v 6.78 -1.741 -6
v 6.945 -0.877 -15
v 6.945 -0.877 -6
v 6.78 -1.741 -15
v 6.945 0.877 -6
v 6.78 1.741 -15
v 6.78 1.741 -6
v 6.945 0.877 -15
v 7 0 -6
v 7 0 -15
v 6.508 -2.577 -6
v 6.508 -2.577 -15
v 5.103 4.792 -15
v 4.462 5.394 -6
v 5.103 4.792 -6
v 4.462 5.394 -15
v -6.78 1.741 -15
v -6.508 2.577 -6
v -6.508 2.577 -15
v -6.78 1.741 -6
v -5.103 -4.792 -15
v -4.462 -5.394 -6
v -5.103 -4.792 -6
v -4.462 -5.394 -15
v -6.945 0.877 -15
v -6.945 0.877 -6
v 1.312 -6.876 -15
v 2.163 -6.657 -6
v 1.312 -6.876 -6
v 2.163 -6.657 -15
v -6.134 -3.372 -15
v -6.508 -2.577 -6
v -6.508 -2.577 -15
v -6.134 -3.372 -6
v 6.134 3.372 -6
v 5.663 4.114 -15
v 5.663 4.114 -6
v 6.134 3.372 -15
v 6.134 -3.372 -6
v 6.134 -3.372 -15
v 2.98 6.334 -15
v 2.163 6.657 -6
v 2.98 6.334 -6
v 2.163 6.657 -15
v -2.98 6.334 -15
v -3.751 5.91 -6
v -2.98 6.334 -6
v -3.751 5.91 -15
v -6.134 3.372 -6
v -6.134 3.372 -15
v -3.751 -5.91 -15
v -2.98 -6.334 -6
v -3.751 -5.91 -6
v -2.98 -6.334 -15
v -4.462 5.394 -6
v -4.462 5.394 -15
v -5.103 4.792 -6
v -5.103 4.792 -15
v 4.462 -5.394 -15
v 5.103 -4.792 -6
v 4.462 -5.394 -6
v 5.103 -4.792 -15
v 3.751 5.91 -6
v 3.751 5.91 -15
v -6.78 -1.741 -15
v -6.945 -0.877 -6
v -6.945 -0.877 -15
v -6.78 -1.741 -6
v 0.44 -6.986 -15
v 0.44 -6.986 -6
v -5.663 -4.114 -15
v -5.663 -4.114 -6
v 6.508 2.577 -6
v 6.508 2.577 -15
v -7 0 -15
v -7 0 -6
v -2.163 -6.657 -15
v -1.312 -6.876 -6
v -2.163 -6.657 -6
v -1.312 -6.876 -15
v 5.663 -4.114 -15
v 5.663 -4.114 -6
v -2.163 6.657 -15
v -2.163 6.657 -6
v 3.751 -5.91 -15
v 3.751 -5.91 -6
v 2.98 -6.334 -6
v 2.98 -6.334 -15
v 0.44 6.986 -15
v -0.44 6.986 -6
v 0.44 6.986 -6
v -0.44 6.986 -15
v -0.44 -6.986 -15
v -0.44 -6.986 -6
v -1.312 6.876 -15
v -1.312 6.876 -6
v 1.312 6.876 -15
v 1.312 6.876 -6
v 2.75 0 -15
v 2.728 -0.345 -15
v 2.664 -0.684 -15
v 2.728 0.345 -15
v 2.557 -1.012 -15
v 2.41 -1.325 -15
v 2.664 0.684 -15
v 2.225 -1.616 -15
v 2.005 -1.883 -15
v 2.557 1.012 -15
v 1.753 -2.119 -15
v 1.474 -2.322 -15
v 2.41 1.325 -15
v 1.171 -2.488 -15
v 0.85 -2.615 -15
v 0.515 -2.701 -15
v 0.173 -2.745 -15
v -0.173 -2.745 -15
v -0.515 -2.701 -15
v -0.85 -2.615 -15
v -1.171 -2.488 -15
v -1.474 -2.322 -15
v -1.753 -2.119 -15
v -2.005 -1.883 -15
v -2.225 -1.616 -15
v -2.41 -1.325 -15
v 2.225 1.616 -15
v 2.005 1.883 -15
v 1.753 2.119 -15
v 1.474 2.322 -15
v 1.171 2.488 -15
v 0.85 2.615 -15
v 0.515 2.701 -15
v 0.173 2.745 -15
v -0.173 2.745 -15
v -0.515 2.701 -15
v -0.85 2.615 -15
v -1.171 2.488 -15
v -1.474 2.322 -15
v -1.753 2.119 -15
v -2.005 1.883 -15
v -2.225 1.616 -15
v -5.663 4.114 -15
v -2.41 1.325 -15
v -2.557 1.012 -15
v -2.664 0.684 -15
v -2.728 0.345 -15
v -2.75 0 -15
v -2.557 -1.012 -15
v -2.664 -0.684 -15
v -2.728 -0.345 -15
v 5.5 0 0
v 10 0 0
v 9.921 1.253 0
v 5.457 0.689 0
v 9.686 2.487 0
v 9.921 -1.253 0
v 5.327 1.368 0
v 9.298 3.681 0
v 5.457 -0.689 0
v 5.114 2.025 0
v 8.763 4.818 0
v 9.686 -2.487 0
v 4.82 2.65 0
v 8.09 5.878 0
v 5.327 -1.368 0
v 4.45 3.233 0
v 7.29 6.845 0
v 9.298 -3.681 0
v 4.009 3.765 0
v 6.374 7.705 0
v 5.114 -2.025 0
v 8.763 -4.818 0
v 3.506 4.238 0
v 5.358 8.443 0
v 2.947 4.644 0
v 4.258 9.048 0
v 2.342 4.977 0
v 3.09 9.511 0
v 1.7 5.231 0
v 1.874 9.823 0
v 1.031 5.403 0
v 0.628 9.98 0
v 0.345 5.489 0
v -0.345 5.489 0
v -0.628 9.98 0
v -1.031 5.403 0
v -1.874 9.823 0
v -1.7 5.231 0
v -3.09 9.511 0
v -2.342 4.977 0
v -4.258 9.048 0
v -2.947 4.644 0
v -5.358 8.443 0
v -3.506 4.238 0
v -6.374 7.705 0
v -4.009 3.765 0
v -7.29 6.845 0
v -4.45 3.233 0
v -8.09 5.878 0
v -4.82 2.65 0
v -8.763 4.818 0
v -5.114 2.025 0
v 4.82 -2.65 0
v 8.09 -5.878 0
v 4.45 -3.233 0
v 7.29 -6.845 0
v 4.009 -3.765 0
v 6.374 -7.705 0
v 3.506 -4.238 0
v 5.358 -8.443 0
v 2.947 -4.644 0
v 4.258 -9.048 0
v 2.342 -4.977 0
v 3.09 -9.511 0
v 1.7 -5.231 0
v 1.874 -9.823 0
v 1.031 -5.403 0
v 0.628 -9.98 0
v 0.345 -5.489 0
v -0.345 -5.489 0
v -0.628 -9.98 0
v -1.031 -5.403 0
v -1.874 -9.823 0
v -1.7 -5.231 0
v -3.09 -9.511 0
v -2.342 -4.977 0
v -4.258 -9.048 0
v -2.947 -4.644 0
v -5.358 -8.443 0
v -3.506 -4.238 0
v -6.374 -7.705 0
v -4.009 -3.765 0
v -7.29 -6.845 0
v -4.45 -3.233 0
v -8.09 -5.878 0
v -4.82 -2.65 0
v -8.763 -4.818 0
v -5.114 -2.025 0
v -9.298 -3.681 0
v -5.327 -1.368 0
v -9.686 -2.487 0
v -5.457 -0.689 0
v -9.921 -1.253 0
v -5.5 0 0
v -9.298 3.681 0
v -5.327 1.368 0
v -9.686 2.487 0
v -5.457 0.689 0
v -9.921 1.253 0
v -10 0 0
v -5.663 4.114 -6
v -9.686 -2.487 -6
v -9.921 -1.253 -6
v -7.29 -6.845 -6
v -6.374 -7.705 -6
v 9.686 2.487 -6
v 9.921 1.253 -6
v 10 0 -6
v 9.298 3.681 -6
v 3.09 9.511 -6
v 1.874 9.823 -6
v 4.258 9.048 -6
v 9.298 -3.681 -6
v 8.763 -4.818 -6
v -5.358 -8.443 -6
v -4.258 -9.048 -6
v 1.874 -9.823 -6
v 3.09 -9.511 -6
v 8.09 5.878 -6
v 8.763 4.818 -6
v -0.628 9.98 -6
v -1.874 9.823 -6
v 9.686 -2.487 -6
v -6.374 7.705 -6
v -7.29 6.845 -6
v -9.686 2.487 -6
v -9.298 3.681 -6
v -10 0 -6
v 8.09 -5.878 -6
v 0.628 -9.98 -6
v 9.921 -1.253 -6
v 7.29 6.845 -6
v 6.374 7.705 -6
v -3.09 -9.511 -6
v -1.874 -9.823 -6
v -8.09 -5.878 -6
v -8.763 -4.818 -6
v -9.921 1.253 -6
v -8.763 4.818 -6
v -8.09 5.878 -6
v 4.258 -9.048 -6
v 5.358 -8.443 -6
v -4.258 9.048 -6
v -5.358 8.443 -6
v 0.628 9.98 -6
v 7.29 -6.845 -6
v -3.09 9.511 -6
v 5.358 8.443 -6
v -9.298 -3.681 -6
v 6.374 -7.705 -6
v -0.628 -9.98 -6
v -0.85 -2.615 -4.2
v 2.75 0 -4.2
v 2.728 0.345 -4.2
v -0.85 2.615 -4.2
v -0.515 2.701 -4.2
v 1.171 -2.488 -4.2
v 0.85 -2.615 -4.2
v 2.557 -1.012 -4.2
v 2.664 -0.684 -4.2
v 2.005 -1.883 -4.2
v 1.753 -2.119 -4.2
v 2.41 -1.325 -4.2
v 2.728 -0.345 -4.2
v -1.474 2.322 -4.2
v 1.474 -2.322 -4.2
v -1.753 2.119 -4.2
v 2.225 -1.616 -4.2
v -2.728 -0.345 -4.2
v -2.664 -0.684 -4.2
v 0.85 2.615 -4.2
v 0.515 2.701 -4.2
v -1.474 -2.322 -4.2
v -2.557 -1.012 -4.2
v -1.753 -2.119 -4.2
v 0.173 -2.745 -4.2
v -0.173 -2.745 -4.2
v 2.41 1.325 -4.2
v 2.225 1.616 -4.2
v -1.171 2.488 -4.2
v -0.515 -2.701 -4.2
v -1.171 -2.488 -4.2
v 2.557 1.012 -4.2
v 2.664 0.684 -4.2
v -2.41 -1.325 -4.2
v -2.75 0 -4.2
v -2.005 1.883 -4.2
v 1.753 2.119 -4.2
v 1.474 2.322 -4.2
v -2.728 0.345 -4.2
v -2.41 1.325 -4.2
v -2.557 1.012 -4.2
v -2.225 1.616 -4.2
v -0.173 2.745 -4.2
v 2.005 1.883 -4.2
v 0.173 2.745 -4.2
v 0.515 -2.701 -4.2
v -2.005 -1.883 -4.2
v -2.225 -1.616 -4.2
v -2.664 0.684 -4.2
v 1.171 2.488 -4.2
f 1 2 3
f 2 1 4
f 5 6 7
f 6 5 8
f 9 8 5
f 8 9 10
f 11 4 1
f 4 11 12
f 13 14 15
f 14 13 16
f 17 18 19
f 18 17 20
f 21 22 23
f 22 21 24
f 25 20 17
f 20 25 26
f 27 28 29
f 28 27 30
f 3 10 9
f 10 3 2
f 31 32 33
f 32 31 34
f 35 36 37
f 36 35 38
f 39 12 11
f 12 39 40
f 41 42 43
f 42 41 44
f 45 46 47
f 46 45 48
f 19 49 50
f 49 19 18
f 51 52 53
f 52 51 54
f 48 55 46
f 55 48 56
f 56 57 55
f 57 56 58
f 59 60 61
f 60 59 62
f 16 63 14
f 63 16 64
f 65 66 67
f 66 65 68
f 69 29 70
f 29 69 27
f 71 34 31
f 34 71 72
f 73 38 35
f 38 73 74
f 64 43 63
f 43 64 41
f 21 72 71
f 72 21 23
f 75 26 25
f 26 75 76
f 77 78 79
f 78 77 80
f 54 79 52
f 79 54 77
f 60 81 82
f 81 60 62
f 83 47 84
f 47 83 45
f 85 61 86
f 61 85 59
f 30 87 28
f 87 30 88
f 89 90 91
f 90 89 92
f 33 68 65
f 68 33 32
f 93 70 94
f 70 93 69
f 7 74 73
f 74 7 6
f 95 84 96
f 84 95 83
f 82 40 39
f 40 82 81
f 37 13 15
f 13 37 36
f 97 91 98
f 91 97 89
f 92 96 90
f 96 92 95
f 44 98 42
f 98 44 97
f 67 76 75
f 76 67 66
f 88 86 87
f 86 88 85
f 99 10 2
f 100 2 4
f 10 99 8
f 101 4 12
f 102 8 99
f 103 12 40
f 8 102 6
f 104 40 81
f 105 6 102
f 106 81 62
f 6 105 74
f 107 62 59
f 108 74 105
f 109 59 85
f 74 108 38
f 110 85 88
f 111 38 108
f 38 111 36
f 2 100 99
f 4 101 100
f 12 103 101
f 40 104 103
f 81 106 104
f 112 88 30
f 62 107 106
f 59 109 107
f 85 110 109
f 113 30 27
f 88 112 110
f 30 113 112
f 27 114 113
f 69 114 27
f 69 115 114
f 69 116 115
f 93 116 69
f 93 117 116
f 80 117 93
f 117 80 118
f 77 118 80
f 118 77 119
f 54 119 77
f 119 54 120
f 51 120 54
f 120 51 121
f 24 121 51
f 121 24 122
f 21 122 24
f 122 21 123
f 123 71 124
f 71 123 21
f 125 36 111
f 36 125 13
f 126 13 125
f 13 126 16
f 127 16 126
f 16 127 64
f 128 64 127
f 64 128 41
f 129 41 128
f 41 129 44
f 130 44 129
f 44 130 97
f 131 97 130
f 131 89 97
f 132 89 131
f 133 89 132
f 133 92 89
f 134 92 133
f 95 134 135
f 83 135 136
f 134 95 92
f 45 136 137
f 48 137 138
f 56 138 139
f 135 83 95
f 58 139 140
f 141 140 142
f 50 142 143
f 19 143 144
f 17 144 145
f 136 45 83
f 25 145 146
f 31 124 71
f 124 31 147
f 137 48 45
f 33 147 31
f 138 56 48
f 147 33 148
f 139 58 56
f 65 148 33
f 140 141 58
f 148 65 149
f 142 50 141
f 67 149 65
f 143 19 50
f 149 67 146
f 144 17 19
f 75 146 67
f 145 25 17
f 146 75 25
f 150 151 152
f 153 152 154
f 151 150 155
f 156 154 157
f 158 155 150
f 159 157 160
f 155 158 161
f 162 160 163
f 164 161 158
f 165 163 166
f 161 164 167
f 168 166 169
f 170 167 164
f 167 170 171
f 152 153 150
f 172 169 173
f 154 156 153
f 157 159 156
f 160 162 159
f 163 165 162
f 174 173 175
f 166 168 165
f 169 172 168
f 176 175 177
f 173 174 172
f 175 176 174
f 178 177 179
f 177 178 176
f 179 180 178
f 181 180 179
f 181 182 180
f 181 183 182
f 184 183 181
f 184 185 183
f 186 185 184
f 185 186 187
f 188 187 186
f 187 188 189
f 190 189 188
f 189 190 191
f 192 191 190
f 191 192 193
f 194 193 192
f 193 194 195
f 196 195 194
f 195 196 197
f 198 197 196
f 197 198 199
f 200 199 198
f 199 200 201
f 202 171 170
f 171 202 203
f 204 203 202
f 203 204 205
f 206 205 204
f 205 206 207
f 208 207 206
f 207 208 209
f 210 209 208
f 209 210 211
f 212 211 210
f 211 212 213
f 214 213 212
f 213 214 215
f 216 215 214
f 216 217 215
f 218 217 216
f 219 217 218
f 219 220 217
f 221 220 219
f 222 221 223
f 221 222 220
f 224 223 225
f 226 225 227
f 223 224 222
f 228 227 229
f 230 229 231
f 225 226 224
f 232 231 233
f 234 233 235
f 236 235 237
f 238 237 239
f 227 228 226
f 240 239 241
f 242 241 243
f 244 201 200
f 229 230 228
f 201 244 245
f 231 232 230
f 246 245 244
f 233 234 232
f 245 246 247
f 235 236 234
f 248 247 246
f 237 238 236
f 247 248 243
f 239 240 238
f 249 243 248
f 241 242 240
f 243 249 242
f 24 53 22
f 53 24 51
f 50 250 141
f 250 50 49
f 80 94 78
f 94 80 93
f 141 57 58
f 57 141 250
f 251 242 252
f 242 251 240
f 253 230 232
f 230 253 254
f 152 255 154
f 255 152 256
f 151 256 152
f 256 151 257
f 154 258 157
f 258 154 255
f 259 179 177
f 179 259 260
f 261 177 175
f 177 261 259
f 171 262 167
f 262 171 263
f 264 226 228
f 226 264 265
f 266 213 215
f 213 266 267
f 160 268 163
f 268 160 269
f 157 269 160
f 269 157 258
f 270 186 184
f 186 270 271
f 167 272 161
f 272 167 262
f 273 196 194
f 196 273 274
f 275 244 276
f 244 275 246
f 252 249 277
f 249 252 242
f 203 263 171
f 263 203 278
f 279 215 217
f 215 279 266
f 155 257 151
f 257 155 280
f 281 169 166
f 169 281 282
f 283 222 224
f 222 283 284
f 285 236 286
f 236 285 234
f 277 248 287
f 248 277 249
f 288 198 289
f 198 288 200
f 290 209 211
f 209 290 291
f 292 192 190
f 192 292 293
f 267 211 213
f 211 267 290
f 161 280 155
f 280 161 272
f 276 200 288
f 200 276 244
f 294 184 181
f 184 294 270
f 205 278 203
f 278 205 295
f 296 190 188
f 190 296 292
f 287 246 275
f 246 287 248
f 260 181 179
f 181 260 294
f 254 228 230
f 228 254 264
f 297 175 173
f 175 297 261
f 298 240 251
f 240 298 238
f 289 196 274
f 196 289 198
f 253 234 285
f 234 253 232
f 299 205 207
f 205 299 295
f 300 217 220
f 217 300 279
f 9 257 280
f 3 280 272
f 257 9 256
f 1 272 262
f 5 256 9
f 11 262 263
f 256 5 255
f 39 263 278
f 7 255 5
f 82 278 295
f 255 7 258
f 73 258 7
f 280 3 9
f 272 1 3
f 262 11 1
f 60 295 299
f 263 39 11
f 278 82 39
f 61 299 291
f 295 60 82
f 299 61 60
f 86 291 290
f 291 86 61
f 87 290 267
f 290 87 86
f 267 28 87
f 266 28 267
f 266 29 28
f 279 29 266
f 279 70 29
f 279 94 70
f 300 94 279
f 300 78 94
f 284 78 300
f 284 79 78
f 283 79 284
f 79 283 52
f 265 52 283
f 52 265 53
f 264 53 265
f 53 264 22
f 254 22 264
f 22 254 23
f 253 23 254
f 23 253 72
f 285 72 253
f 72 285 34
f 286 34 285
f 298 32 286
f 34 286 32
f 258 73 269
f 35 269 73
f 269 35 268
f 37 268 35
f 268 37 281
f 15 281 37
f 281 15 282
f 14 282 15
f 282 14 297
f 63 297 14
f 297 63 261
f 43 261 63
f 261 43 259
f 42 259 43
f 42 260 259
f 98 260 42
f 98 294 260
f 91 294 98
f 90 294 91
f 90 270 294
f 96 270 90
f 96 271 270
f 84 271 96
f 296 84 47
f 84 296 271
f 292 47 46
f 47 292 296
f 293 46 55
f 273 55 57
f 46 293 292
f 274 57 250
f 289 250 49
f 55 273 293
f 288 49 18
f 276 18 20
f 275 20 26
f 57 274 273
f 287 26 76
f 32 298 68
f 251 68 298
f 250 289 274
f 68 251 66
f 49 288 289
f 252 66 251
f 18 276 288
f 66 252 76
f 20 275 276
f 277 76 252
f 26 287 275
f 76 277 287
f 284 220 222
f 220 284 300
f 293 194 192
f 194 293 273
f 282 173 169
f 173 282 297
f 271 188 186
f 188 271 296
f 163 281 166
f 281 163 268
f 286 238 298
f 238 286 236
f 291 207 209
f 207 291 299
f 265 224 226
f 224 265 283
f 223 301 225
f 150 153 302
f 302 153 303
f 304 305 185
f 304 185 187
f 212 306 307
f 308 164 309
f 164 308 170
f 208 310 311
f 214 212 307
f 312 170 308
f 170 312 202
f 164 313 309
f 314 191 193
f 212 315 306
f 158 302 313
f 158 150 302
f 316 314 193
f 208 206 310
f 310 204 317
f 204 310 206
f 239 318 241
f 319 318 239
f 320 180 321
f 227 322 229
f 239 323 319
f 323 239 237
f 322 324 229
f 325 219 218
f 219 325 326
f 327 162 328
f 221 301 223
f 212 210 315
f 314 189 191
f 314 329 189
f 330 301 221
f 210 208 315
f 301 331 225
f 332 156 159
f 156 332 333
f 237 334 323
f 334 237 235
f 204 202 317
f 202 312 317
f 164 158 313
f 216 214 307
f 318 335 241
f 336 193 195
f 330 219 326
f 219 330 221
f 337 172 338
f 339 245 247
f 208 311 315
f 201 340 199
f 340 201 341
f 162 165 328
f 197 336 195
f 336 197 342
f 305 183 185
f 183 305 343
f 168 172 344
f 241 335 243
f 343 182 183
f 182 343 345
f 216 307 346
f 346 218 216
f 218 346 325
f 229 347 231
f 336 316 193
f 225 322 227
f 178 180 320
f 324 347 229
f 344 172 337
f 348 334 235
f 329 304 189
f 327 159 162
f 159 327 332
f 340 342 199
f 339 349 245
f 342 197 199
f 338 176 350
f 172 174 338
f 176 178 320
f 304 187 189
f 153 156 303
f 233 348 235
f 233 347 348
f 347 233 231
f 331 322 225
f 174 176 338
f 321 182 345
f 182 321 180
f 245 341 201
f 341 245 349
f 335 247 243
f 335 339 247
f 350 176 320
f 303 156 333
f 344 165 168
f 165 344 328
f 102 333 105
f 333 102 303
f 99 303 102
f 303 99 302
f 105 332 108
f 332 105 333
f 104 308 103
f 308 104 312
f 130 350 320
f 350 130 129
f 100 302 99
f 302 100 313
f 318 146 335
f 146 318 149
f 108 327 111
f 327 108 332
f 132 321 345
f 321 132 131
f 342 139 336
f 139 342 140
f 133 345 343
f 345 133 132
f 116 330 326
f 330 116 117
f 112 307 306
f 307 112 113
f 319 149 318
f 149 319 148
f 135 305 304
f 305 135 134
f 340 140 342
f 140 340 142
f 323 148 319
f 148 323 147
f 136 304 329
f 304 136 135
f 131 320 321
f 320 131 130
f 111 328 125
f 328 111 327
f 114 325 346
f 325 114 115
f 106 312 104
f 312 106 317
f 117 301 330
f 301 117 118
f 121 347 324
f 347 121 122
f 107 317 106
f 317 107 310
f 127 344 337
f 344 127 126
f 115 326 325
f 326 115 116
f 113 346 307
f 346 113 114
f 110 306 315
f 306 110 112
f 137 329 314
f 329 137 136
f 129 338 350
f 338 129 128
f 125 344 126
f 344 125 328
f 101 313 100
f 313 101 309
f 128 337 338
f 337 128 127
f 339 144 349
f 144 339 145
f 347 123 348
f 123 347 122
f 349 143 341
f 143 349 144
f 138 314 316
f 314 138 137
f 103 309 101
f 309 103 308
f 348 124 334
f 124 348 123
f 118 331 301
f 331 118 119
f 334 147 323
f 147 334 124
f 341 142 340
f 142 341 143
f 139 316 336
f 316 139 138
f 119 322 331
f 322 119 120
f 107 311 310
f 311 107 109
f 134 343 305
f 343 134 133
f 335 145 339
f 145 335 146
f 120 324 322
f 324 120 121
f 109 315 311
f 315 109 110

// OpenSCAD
$fn = 50;


difference() {
	union() {
		translate(v = [0, 0, -15.0000000000]) {
			cylinder(h = 15, r = 7.0000000000);
		}
		translate(v = [0, 0, -6.0000000000]) {
			cylinder(h = 6, r = 10.0000000000);
		}
	}
	union() {
		translate(v = [0, 0, 0]) {
			rotate(a = [0, 0, 0]) {
				difference() {
					union() {
						#translate(v = [0, 0, -15.0000000000]) {
							cylinder(h = 15, r = 2.2500000000);
						}
						#translate(v = [0, 0, -4.2000000000]) {
							cylinder(h = 4.2000000000, r = 7.0000000000, r1 = 2.7500000000, r2 = 5.5000000000);
						}
						#translate(v = [0, 0, -15.0000000000]) {
							cylinder(h = 15, r = 2.7500000000);
						}
						#translate(v = [0, 0, -15.0000000000]) {
							cylinder(h = 15, r = 2.2500000000);
						}
					}
					union();
				}
			}
		}
	}
}
